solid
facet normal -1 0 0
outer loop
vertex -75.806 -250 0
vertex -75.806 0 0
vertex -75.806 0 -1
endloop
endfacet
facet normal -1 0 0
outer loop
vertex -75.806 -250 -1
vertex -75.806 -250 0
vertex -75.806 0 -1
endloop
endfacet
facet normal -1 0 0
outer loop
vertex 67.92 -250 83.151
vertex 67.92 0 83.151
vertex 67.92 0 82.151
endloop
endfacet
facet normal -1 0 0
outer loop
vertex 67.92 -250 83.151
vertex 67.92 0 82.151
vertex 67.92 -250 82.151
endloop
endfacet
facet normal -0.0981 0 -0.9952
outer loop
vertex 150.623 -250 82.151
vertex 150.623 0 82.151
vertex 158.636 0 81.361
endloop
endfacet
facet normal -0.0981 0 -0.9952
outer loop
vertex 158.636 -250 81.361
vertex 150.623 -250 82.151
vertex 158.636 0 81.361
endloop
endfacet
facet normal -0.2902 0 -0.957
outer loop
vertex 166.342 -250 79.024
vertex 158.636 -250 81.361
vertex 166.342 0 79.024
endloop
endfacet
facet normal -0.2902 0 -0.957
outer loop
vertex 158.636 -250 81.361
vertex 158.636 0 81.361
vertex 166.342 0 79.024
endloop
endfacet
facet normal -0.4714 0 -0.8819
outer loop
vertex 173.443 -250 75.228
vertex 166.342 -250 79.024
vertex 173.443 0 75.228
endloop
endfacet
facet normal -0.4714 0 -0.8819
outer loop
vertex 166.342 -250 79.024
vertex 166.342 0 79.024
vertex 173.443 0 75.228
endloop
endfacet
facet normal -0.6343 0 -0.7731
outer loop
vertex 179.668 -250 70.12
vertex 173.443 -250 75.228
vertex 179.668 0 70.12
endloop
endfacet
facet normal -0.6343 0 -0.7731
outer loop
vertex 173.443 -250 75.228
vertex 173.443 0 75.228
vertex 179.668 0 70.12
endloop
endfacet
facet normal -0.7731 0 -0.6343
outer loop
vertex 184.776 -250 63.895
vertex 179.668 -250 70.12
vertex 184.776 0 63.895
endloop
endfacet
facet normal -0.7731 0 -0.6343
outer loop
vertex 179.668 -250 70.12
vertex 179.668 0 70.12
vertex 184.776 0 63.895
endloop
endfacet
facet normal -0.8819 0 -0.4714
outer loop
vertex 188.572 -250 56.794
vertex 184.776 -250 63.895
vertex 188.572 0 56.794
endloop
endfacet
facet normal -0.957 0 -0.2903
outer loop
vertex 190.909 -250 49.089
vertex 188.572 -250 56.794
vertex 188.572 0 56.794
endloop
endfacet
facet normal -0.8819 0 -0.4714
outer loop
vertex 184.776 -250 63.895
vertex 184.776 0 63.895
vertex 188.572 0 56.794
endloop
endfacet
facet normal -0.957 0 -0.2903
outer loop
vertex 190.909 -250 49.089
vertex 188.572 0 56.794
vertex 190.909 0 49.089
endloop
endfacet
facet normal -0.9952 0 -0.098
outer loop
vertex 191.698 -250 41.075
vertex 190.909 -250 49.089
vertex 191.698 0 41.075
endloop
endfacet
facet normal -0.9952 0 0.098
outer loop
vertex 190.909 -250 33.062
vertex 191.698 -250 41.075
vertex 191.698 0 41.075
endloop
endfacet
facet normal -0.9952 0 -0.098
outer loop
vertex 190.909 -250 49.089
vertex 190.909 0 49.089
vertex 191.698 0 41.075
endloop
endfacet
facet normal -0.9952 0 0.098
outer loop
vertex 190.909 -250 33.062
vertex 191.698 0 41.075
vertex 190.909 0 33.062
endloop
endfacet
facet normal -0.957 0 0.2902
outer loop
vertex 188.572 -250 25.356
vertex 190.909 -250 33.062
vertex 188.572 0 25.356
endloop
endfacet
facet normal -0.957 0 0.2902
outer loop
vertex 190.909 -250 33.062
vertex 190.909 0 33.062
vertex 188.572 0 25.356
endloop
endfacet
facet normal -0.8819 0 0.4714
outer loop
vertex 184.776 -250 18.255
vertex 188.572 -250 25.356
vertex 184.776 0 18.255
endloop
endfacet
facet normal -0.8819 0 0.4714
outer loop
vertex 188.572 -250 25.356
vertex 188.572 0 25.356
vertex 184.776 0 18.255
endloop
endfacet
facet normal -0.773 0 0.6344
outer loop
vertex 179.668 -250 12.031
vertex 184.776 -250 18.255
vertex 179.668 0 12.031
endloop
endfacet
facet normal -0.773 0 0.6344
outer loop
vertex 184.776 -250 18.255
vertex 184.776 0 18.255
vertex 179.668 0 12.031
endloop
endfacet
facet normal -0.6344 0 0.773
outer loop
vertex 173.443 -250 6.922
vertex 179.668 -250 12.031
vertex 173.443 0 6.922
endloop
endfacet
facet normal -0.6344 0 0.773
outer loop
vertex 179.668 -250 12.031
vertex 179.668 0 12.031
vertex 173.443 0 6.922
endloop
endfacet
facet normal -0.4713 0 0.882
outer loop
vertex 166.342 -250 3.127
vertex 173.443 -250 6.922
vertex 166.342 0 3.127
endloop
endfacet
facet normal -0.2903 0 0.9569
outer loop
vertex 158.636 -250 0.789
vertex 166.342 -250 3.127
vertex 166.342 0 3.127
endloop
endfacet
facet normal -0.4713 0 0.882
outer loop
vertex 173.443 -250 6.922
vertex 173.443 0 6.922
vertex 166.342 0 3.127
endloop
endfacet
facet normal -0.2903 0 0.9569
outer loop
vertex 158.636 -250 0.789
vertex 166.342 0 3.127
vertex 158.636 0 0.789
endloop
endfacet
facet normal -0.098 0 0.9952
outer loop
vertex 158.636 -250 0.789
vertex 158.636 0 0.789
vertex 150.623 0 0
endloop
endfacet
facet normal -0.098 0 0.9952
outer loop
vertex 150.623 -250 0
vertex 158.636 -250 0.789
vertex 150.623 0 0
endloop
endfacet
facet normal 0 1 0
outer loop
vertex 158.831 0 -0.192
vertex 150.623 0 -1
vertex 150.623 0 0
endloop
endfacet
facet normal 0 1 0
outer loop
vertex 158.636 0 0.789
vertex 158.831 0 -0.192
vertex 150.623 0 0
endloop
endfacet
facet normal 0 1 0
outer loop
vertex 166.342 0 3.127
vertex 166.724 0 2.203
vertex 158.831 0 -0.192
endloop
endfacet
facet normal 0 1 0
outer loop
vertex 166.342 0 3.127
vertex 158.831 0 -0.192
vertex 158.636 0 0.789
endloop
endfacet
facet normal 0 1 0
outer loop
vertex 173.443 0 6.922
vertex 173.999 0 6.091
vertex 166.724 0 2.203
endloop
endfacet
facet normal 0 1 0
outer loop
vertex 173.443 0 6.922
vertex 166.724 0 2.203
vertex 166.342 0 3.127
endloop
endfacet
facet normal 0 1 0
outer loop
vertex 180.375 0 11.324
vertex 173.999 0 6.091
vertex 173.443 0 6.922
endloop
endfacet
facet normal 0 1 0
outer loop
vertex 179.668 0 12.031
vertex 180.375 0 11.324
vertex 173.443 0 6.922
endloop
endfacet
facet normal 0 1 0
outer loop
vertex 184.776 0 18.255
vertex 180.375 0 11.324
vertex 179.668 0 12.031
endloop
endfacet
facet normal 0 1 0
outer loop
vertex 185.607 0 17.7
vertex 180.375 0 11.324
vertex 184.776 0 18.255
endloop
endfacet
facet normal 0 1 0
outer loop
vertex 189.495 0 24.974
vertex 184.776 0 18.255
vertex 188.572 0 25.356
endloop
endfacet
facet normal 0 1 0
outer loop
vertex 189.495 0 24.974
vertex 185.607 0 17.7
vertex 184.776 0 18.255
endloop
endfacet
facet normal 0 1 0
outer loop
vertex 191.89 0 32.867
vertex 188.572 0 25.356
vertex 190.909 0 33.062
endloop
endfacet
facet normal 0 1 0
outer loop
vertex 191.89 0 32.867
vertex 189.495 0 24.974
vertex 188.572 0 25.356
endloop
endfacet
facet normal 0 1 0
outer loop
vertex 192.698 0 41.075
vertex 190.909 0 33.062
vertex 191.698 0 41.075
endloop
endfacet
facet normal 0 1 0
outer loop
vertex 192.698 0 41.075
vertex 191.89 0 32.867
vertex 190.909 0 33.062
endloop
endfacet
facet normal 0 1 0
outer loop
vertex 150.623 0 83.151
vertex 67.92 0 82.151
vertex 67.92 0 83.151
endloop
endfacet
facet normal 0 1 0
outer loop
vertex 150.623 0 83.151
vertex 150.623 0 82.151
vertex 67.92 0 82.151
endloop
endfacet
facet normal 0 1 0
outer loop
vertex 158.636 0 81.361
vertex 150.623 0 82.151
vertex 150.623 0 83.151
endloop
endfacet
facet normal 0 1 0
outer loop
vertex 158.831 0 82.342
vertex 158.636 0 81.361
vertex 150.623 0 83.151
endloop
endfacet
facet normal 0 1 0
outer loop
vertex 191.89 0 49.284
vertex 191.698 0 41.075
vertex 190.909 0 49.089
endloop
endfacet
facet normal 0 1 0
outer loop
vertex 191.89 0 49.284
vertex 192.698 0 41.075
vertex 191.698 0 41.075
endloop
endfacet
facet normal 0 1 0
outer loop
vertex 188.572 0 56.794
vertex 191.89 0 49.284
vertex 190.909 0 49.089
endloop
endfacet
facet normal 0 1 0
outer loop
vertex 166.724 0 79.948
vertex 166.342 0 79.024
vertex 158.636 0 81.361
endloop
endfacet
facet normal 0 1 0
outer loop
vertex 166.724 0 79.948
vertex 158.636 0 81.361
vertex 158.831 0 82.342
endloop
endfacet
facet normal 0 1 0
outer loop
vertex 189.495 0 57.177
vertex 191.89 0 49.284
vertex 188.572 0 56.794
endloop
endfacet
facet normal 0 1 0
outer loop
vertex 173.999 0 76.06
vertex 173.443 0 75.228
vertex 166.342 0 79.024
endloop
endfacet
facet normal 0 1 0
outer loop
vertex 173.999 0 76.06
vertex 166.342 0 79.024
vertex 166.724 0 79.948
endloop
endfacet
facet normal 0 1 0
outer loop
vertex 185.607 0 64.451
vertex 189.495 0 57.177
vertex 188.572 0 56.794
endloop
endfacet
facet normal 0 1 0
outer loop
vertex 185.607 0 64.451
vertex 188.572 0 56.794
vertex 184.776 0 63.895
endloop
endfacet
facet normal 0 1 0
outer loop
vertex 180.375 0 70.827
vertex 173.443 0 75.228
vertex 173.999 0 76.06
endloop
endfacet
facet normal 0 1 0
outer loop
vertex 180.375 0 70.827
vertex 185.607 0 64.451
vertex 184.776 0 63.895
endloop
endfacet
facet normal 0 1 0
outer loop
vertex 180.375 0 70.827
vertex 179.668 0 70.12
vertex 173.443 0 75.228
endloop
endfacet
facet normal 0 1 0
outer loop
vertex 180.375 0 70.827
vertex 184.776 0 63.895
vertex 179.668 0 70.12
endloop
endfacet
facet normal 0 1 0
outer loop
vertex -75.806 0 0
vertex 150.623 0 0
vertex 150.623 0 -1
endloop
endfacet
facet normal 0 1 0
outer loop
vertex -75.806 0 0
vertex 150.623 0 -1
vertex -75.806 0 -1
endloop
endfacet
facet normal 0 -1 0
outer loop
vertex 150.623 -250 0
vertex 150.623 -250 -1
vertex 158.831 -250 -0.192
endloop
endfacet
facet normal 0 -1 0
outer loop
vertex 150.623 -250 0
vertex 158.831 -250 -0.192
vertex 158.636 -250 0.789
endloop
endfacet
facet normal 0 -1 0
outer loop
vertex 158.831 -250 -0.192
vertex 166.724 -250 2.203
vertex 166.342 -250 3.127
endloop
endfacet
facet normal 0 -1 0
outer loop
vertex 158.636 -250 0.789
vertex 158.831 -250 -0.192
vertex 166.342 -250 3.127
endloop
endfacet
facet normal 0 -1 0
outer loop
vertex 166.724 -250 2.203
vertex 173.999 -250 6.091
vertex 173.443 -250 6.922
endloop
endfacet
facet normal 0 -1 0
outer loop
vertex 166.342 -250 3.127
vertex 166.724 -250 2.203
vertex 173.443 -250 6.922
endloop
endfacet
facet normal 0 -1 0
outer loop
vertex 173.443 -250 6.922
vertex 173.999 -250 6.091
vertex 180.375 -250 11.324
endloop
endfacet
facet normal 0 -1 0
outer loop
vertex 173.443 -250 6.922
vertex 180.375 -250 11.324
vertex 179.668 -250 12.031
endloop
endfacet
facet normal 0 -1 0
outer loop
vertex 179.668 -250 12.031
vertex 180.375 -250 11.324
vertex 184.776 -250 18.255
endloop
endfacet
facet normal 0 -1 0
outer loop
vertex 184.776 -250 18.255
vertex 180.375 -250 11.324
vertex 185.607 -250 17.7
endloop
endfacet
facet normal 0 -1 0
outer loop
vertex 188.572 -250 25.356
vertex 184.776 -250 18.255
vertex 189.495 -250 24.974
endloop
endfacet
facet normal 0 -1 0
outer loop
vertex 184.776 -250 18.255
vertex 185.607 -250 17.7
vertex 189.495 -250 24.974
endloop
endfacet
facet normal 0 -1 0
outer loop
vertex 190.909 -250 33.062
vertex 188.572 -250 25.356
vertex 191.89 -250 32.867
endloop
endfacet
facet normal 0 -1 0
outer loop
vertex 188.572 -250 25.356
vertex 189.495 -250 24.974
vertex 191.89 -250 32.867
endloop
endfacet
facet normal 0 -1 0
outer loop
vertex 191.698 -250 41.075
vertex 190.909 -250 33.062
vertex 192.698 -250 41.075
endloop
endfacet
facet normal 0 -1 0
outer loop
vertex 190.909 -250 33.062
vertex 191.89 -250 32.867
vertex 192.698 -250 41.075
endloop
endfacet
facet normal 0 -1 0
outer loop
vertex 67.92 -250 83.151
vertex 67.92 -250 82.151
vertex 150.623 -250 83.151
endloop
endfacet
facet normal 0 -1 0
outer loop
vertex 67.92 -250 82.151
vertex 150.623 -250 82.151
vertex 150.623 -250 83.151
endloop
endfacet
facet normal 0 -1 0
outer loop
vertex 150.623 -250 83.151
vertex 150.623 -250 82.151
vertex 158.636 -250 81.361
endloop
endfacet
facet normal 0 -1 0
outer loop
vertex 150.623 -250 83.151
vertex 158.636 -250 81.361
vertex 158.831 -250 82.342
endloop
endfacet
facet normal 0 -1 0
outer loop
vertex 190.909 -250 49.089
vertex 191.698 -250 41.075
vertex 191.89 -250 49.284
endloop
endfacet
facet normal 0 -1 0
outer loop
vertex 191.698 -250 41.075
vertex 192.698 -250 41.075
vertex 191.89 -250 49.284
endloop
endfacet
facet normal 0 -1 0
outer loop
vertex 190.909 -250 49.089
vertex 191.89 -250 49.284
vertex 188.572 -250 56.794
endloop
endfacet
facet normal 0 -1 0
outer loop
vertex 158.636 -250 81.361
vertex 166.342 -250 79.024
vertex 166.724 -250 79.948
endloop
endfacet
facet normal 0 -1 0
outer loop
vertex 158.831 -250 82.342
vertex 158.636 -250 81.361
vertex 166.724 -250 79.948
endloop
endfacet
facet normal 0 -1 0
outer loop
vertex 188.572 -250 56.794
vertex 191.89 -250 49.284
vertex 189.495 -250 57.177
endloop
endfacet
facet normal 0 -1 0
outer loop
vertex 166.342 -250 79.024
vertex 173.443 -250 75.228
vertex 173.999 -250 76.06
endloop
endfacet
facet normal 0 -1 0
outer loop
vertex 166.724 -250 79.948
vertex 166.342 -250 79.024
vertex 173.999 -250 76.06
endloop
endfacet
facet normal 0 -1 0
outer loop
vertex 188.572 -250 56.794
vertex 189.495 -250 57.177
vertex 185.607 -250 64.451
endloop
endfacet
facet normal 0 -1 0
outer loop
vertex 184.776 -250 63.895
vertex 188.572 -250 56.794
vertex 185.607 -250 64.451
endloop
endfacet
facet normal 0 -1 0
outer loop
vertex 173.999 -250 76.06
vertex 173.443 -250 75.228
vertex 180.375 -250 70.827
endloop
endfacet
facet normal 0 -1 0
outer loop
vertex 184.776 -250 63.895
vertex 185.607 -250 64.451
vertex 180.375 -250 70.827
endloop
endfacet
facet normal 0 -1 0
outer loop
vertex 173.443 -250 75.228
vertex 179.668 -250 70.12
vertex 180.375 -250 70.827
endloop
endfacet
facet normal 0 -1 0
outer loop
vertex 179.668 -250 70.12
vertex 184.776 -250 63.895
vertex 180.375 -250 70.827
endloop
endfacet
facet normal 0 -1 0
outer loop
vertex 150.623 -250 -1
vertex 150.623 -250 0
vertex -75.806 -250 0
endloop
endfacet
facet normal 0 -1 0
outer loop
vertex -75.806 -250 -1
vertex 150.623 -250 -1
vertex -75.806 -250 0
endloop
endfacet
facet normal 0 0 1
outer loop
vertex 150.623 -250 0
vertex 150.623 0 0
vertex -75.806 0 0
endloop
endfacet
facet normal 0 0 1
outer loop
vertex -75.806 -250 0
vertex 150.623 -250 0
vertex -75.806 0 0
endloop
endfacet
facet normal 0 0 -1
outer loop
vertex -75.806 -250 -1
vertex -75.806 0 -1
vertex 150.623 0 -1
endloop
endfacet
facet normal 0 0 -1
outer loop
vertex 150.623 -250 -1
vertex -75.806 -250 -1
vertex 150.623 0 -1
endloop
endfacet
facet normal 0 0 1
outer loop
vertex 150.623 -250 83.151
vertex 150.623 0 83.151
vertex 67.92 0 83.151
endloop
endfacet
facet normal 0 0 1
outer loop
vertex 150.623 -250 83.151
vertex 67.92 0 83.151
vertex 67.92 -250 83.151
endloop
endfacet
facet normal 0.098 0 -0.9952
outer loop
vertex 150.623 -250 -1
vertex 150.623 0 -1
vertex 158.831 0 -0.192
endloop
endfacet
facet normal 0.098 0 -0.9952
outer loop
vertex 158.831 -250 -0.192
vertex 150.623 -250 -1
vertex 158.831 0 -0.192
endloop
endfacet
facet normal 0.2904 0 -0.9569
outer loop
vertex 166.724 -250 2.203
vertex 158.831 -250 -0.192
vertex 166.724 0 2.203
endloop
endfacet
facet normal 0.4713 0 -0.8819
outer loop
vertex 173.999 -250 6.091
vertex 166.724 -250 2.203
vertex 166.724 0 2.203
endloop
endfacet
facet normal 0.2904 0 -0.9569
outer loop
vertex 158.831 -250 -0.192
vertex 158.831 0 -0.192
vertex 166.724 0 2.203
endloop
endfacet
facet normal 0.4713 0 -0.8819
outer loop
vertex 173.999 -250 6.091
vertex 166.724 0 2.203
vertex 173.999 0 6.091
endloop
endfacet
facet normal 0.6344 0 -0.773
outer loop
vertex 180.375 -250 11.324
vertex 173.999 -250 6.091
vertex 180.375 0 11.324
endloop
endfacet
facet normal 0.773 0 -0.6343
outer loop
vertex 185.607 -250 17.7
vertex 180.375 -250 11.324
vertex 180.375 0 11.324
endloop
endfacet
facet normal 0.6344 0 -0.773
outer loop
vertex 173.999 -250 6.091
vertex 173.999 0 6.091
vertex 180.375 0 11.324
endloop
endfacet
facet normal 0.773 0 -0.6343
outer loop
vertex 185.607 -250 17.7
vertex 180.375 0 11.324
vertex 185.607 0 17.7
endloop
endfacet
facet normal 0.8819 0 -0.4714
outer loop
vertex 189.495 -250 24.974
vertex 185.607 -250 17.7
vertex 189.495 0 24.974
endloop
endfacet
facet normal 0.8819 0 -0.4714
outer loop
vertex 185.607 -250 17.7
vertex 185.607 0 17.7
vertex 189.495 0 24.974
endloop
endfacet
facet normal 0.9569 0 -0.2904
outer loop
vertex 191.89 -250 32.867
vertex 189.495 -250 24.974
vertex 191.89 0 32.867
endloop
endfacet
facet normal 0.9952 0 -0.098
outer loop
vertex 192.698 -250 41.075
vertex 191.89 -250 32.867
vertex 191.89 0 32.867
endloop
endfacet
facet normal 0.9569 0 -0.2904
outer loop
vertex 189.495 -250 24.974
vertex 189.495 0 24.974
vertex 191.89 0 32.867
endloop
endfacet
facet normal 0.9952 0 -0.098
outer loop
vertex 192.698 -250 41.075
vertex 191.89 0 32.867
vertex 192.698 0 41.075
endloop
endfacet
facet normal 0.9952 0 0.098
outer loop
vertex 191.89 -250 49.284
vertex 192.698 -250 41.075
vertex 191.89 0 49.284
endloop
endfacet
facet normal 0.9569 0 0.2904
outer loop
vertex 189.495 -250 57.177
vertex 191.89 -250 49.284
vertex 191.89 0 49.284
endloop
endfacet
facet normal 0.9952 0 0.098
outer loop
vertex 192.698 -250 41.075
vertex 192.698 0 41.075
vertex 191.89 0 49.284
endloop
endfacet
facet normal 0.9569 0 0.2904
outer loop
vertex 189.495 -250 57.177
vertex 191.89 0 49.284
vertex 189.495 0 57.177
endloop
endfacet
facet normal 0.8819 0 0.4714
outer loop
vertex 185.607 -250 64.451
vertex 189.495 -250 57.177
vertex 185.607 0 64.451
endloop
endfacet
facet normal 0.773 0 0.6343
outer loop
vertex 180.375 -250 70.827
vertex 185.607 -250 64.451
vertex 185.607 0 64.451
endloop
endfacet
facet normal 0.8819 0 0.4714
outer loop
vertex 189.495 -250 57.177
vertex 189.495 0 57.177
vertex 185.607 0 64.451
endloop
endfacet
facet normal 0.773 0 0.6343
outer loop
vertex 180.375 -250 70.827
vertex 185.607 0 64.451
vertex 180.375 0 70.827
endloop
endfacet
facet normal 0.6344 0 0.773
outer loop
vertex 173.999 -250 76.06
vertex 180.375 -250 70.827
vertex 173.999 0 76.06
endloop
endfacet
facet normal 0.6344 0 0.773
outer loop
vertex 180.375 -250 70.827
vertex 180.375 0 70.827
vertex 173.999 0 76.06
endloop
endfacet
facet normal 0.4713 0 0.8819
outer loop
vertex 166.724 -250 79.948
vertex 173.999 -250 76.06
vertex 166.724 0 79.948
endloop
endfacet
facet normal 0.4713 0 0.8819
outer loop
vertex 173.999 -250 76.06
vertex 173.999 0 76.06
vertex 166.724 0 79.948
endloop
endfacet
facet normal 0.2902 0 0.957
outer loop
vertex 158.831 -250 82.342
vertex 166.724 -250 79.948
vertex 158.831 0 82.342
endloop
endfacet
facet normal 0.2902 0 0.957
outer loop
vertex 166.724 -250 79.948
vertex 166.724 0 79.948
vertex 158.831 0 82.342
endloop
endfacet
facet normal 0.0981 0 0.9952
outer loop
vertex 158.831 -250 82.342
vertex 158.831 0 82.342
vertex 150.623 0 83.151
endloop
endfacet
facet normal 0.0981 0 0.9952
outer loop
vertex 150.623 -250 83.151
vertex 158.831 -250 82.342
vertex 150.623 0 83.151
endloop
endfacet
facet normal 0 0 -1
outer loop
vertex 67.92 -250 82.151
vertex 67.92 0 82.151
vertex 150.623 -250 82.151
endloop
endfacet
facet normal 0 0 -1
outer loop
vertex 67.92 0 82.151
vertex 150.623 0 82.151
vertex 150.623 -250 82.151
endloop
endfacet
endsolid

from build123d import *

# Parameters (mm, degrees)
F1_DEPTH  = 250
F1_FACE_W = 250
F1_FACE_H = 1
F2_DEPTH  = 25


with BuildPart() as f1:
    # F0 (on Front) → F1 (new body)
    with BuildSketch(Plane.XZ):
        with BuildLine():
            Line((150.622934, 0), (-75.805686, 0))
            Line((-75.805686, 0), (-75.805686, -1))
            Line((-75.805686, -1), (150.622934, -1))
            ThreePointArc((150.622934, -1), (192.698204, 41.07527), (150.622934, 83.15054))
            Line((150.622934, 83.15054), (92.919543, 83.15054))
            Line((92.919543, 83.15054), (92.919543, 82.15054))
            Line((92.919543, 82.15054), (150.622934, 82.15054))
            ThreePointArc((150.622934, 82.15054), (191.698204, 41.07527), (150.622934, 0))
        make_face()
    extrude(amount=F1_DEPTH)

    # F1_face (on face) → F2 (join)
    with BuildSketch(Plane(origin=(92.919543, -125, 82.65054), x_dir=(0, -1, 0), z_dir=(-1, 0, 0))):
        Rectangle(F1_FACE_W, F1_FACE_H)
    extrude(amount=F2_DEPTH)


solid = f1.part
